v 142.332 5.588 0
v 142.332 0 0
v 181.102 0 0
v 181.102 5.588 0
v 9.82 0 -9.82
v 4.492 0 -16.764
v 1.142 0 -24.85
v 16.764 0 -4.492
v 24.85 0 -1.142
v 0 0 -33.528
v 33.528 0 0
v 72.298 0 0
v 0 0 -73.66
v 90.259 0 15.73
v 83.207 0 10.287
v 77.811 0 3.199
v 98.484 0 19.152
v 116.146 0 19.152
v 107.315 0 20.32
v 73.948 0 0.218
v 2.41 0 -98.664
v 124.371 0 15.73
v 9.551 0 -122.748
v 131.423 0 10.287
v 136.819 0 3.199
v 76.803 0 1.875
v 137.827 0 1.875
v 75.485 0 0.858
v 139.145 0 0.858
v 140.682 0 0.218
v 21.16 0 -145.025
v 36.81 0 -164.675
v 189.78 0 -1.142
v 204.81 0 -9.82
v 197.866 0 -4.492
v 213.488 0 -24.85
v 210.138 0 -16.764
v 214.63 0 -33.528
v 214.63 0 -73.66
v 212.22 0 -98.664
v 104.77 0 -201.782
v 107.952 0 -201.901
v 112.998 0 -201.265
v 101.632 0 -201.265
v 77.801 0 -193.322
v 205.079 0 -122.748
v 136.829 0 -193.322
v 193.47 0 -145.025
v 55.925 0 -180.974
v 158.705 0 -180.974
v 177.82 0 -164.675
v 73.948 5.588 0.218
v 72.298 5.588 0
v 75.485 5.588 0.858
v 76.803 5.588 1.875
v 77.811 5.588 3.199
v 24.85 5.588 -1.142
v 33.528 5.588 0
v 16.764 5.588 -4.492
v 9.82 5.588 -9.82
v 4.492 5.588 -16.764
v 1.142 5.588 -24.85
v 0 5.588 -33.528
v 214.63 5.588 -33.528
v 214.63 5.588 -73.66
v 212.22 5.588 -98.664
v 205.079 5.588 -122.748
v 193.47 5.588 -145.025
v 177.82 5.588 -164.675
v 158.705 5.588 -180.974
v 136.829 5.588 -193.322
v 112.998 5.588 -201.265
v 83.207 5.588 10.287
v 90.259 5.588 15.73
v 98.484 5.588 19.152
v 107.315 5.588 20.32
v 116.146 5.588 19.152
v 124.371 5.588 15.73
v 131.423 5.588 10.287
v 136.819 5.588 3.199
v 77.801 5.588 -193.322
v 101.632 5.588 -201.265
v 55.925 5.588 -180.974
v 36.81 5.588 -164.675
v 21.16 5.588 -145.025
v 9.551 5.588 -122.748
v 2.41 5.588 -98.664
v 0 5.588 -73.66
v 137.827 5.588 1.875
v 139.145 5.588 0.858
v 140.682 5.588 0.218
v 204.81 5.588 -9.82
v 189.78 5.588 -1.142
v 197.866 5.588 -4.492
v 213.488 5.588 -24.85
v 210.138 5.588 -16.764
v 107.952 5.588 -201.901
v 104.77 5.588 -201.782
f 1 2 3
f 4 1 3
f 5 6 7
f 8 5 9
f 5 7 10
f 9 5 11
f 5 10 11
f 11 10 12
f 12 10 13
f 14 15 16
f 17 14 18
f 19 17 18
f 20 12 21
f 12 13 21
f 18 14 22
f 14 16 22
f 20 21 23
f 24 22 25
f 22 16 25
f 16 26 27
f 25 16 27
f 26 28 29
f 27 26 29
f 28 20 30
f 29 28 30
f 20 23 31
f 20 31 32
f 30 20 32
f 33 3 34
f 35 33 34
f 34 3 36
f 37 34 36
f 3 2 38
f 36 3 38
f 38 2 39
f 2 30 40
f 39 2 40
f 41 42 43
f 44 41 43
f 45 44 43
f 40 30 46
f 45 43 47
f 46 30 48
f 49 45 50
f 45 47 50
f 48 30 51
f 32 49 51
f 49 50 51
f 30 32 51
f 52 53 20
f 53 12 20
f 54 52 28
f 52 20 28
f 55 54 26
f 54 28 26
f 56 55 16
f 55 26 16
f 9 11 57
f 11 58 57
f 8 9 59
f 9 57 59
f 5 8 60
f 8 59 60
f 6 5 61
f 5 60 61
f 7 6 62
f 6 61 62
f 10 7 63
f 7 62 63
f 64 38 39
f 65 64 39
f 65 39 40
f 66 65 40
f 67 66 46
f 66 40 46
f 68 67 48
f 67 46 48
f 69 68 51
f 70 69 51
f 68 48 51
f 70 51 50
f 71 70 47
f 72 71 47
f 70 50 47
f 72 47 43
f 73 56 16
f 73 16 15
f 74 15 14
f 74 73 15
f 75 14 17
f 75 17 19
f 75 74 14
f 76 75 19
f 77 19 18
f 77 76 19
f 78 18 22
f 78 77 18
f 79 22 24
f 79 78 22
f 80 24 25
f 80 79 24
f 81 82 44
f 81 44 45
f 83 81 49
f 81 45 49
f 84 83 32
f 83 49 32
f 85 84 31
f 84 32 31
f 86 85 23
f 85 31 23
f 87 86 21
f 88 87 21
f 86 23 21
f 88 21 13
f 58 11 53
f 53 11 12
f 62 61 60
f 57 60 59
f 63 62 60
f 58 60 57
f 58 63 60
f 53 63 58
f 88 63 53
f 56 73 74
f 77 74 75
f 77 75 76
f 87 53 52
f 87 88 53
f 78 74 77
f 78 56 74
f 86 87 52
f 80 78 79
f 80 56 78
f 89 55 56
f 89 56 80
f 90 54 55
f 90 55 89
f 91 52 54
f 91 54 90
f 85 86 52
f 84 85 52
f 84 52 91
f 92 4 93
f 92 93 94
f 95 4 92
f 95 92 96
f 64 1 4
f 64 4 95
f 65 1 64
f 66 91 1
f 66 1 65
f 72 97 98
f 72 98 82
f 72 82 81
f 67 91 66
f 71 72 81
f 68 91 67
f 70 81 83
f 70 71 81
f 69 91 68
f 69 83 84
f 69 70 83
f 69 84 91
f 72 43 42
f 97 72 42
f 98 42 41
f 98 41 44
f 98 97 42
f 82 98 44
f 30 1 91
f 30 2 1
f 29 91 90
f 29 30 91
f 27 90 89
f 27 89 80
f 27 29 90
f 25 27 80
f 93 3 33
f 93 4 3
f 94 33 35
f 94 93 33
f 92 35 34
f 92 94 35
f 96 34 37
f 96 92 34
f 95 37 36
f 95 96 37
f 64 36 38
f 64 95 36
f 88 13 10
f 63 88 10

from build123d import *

# Parameters (mm, degrees)
BOSS_EXTRUDE1_DEPTH = 5.588
FILLET1_R           = 25.4
BOSS_EXTRUDE2_DEPTH = 5.588
FILLET2_R           = 6.35
FILLET3_R           = 33.528


with BuildPart() as part:
    # Sketch1 → Boss-Extrude1 (new body)
    with BuildSketch(Plane(origin=(0, 0, 0), x_dir=(1, 0, 0), z_dir=(0, 1, 0))):
        with BuildLine():
            Line((0, 0), (214.63, 0))
            Line((214.63, 0), (214.63, 73.66))
            ThreePointArc((214.63, 73.66), (184.284533276, 157.475694397), (107.315, 202.438))
            ThreePointArc((107.315, 202.438), (30.345466724, 157.475694397), (0, 73.66))
            Line((0, 73.66), (0, 0))
        make_face()
    extrude(amount=BOSS_EXTRUDE1_DEPTH)

    # Fillet1
    fillet1_edges = [part.edges().sort_by_distance(p)[0] for p in [
        (107.315, 2.794, -202.438),
    ]]
    fillet(fillet1_edges, radius=FILLET1_R)

    # Sketch2 → Boss-Extrude2 (add)
    with BuildSketch(Plane(origin=(0, 5.588, 0), x_dir=(1, 0, 0), z_dir=(0, 1, 0))):
        with BuildLine():
            Line((138.43, 0), (76.2, 0))
            ThreePointArc((76.2, 0), (107.315, -20.32), (138.43, 0))
        make_face()
    extrude(amount=-BOSS_EXTRUDE2_DEPTH)

    # Fillet2
    fillet2_edges = [part.edges().sort_by_distance(p)[0] for p in [
        (76.2, 2.794, 0),
        (138.43, 2.794, 0),
    ]]
    fillet(fillet2_edges, radius=FILLET2_R)

    # Fillet3
    fillet3_edges = [part.edges().sort_by_distance(p)[0] for p in [
        (214.63, 2.794, 0),
        (0, 2.794, 0),
    ]]
    fillet(fillet3_edges, radius=FILLET3_R)


solid = part.part
